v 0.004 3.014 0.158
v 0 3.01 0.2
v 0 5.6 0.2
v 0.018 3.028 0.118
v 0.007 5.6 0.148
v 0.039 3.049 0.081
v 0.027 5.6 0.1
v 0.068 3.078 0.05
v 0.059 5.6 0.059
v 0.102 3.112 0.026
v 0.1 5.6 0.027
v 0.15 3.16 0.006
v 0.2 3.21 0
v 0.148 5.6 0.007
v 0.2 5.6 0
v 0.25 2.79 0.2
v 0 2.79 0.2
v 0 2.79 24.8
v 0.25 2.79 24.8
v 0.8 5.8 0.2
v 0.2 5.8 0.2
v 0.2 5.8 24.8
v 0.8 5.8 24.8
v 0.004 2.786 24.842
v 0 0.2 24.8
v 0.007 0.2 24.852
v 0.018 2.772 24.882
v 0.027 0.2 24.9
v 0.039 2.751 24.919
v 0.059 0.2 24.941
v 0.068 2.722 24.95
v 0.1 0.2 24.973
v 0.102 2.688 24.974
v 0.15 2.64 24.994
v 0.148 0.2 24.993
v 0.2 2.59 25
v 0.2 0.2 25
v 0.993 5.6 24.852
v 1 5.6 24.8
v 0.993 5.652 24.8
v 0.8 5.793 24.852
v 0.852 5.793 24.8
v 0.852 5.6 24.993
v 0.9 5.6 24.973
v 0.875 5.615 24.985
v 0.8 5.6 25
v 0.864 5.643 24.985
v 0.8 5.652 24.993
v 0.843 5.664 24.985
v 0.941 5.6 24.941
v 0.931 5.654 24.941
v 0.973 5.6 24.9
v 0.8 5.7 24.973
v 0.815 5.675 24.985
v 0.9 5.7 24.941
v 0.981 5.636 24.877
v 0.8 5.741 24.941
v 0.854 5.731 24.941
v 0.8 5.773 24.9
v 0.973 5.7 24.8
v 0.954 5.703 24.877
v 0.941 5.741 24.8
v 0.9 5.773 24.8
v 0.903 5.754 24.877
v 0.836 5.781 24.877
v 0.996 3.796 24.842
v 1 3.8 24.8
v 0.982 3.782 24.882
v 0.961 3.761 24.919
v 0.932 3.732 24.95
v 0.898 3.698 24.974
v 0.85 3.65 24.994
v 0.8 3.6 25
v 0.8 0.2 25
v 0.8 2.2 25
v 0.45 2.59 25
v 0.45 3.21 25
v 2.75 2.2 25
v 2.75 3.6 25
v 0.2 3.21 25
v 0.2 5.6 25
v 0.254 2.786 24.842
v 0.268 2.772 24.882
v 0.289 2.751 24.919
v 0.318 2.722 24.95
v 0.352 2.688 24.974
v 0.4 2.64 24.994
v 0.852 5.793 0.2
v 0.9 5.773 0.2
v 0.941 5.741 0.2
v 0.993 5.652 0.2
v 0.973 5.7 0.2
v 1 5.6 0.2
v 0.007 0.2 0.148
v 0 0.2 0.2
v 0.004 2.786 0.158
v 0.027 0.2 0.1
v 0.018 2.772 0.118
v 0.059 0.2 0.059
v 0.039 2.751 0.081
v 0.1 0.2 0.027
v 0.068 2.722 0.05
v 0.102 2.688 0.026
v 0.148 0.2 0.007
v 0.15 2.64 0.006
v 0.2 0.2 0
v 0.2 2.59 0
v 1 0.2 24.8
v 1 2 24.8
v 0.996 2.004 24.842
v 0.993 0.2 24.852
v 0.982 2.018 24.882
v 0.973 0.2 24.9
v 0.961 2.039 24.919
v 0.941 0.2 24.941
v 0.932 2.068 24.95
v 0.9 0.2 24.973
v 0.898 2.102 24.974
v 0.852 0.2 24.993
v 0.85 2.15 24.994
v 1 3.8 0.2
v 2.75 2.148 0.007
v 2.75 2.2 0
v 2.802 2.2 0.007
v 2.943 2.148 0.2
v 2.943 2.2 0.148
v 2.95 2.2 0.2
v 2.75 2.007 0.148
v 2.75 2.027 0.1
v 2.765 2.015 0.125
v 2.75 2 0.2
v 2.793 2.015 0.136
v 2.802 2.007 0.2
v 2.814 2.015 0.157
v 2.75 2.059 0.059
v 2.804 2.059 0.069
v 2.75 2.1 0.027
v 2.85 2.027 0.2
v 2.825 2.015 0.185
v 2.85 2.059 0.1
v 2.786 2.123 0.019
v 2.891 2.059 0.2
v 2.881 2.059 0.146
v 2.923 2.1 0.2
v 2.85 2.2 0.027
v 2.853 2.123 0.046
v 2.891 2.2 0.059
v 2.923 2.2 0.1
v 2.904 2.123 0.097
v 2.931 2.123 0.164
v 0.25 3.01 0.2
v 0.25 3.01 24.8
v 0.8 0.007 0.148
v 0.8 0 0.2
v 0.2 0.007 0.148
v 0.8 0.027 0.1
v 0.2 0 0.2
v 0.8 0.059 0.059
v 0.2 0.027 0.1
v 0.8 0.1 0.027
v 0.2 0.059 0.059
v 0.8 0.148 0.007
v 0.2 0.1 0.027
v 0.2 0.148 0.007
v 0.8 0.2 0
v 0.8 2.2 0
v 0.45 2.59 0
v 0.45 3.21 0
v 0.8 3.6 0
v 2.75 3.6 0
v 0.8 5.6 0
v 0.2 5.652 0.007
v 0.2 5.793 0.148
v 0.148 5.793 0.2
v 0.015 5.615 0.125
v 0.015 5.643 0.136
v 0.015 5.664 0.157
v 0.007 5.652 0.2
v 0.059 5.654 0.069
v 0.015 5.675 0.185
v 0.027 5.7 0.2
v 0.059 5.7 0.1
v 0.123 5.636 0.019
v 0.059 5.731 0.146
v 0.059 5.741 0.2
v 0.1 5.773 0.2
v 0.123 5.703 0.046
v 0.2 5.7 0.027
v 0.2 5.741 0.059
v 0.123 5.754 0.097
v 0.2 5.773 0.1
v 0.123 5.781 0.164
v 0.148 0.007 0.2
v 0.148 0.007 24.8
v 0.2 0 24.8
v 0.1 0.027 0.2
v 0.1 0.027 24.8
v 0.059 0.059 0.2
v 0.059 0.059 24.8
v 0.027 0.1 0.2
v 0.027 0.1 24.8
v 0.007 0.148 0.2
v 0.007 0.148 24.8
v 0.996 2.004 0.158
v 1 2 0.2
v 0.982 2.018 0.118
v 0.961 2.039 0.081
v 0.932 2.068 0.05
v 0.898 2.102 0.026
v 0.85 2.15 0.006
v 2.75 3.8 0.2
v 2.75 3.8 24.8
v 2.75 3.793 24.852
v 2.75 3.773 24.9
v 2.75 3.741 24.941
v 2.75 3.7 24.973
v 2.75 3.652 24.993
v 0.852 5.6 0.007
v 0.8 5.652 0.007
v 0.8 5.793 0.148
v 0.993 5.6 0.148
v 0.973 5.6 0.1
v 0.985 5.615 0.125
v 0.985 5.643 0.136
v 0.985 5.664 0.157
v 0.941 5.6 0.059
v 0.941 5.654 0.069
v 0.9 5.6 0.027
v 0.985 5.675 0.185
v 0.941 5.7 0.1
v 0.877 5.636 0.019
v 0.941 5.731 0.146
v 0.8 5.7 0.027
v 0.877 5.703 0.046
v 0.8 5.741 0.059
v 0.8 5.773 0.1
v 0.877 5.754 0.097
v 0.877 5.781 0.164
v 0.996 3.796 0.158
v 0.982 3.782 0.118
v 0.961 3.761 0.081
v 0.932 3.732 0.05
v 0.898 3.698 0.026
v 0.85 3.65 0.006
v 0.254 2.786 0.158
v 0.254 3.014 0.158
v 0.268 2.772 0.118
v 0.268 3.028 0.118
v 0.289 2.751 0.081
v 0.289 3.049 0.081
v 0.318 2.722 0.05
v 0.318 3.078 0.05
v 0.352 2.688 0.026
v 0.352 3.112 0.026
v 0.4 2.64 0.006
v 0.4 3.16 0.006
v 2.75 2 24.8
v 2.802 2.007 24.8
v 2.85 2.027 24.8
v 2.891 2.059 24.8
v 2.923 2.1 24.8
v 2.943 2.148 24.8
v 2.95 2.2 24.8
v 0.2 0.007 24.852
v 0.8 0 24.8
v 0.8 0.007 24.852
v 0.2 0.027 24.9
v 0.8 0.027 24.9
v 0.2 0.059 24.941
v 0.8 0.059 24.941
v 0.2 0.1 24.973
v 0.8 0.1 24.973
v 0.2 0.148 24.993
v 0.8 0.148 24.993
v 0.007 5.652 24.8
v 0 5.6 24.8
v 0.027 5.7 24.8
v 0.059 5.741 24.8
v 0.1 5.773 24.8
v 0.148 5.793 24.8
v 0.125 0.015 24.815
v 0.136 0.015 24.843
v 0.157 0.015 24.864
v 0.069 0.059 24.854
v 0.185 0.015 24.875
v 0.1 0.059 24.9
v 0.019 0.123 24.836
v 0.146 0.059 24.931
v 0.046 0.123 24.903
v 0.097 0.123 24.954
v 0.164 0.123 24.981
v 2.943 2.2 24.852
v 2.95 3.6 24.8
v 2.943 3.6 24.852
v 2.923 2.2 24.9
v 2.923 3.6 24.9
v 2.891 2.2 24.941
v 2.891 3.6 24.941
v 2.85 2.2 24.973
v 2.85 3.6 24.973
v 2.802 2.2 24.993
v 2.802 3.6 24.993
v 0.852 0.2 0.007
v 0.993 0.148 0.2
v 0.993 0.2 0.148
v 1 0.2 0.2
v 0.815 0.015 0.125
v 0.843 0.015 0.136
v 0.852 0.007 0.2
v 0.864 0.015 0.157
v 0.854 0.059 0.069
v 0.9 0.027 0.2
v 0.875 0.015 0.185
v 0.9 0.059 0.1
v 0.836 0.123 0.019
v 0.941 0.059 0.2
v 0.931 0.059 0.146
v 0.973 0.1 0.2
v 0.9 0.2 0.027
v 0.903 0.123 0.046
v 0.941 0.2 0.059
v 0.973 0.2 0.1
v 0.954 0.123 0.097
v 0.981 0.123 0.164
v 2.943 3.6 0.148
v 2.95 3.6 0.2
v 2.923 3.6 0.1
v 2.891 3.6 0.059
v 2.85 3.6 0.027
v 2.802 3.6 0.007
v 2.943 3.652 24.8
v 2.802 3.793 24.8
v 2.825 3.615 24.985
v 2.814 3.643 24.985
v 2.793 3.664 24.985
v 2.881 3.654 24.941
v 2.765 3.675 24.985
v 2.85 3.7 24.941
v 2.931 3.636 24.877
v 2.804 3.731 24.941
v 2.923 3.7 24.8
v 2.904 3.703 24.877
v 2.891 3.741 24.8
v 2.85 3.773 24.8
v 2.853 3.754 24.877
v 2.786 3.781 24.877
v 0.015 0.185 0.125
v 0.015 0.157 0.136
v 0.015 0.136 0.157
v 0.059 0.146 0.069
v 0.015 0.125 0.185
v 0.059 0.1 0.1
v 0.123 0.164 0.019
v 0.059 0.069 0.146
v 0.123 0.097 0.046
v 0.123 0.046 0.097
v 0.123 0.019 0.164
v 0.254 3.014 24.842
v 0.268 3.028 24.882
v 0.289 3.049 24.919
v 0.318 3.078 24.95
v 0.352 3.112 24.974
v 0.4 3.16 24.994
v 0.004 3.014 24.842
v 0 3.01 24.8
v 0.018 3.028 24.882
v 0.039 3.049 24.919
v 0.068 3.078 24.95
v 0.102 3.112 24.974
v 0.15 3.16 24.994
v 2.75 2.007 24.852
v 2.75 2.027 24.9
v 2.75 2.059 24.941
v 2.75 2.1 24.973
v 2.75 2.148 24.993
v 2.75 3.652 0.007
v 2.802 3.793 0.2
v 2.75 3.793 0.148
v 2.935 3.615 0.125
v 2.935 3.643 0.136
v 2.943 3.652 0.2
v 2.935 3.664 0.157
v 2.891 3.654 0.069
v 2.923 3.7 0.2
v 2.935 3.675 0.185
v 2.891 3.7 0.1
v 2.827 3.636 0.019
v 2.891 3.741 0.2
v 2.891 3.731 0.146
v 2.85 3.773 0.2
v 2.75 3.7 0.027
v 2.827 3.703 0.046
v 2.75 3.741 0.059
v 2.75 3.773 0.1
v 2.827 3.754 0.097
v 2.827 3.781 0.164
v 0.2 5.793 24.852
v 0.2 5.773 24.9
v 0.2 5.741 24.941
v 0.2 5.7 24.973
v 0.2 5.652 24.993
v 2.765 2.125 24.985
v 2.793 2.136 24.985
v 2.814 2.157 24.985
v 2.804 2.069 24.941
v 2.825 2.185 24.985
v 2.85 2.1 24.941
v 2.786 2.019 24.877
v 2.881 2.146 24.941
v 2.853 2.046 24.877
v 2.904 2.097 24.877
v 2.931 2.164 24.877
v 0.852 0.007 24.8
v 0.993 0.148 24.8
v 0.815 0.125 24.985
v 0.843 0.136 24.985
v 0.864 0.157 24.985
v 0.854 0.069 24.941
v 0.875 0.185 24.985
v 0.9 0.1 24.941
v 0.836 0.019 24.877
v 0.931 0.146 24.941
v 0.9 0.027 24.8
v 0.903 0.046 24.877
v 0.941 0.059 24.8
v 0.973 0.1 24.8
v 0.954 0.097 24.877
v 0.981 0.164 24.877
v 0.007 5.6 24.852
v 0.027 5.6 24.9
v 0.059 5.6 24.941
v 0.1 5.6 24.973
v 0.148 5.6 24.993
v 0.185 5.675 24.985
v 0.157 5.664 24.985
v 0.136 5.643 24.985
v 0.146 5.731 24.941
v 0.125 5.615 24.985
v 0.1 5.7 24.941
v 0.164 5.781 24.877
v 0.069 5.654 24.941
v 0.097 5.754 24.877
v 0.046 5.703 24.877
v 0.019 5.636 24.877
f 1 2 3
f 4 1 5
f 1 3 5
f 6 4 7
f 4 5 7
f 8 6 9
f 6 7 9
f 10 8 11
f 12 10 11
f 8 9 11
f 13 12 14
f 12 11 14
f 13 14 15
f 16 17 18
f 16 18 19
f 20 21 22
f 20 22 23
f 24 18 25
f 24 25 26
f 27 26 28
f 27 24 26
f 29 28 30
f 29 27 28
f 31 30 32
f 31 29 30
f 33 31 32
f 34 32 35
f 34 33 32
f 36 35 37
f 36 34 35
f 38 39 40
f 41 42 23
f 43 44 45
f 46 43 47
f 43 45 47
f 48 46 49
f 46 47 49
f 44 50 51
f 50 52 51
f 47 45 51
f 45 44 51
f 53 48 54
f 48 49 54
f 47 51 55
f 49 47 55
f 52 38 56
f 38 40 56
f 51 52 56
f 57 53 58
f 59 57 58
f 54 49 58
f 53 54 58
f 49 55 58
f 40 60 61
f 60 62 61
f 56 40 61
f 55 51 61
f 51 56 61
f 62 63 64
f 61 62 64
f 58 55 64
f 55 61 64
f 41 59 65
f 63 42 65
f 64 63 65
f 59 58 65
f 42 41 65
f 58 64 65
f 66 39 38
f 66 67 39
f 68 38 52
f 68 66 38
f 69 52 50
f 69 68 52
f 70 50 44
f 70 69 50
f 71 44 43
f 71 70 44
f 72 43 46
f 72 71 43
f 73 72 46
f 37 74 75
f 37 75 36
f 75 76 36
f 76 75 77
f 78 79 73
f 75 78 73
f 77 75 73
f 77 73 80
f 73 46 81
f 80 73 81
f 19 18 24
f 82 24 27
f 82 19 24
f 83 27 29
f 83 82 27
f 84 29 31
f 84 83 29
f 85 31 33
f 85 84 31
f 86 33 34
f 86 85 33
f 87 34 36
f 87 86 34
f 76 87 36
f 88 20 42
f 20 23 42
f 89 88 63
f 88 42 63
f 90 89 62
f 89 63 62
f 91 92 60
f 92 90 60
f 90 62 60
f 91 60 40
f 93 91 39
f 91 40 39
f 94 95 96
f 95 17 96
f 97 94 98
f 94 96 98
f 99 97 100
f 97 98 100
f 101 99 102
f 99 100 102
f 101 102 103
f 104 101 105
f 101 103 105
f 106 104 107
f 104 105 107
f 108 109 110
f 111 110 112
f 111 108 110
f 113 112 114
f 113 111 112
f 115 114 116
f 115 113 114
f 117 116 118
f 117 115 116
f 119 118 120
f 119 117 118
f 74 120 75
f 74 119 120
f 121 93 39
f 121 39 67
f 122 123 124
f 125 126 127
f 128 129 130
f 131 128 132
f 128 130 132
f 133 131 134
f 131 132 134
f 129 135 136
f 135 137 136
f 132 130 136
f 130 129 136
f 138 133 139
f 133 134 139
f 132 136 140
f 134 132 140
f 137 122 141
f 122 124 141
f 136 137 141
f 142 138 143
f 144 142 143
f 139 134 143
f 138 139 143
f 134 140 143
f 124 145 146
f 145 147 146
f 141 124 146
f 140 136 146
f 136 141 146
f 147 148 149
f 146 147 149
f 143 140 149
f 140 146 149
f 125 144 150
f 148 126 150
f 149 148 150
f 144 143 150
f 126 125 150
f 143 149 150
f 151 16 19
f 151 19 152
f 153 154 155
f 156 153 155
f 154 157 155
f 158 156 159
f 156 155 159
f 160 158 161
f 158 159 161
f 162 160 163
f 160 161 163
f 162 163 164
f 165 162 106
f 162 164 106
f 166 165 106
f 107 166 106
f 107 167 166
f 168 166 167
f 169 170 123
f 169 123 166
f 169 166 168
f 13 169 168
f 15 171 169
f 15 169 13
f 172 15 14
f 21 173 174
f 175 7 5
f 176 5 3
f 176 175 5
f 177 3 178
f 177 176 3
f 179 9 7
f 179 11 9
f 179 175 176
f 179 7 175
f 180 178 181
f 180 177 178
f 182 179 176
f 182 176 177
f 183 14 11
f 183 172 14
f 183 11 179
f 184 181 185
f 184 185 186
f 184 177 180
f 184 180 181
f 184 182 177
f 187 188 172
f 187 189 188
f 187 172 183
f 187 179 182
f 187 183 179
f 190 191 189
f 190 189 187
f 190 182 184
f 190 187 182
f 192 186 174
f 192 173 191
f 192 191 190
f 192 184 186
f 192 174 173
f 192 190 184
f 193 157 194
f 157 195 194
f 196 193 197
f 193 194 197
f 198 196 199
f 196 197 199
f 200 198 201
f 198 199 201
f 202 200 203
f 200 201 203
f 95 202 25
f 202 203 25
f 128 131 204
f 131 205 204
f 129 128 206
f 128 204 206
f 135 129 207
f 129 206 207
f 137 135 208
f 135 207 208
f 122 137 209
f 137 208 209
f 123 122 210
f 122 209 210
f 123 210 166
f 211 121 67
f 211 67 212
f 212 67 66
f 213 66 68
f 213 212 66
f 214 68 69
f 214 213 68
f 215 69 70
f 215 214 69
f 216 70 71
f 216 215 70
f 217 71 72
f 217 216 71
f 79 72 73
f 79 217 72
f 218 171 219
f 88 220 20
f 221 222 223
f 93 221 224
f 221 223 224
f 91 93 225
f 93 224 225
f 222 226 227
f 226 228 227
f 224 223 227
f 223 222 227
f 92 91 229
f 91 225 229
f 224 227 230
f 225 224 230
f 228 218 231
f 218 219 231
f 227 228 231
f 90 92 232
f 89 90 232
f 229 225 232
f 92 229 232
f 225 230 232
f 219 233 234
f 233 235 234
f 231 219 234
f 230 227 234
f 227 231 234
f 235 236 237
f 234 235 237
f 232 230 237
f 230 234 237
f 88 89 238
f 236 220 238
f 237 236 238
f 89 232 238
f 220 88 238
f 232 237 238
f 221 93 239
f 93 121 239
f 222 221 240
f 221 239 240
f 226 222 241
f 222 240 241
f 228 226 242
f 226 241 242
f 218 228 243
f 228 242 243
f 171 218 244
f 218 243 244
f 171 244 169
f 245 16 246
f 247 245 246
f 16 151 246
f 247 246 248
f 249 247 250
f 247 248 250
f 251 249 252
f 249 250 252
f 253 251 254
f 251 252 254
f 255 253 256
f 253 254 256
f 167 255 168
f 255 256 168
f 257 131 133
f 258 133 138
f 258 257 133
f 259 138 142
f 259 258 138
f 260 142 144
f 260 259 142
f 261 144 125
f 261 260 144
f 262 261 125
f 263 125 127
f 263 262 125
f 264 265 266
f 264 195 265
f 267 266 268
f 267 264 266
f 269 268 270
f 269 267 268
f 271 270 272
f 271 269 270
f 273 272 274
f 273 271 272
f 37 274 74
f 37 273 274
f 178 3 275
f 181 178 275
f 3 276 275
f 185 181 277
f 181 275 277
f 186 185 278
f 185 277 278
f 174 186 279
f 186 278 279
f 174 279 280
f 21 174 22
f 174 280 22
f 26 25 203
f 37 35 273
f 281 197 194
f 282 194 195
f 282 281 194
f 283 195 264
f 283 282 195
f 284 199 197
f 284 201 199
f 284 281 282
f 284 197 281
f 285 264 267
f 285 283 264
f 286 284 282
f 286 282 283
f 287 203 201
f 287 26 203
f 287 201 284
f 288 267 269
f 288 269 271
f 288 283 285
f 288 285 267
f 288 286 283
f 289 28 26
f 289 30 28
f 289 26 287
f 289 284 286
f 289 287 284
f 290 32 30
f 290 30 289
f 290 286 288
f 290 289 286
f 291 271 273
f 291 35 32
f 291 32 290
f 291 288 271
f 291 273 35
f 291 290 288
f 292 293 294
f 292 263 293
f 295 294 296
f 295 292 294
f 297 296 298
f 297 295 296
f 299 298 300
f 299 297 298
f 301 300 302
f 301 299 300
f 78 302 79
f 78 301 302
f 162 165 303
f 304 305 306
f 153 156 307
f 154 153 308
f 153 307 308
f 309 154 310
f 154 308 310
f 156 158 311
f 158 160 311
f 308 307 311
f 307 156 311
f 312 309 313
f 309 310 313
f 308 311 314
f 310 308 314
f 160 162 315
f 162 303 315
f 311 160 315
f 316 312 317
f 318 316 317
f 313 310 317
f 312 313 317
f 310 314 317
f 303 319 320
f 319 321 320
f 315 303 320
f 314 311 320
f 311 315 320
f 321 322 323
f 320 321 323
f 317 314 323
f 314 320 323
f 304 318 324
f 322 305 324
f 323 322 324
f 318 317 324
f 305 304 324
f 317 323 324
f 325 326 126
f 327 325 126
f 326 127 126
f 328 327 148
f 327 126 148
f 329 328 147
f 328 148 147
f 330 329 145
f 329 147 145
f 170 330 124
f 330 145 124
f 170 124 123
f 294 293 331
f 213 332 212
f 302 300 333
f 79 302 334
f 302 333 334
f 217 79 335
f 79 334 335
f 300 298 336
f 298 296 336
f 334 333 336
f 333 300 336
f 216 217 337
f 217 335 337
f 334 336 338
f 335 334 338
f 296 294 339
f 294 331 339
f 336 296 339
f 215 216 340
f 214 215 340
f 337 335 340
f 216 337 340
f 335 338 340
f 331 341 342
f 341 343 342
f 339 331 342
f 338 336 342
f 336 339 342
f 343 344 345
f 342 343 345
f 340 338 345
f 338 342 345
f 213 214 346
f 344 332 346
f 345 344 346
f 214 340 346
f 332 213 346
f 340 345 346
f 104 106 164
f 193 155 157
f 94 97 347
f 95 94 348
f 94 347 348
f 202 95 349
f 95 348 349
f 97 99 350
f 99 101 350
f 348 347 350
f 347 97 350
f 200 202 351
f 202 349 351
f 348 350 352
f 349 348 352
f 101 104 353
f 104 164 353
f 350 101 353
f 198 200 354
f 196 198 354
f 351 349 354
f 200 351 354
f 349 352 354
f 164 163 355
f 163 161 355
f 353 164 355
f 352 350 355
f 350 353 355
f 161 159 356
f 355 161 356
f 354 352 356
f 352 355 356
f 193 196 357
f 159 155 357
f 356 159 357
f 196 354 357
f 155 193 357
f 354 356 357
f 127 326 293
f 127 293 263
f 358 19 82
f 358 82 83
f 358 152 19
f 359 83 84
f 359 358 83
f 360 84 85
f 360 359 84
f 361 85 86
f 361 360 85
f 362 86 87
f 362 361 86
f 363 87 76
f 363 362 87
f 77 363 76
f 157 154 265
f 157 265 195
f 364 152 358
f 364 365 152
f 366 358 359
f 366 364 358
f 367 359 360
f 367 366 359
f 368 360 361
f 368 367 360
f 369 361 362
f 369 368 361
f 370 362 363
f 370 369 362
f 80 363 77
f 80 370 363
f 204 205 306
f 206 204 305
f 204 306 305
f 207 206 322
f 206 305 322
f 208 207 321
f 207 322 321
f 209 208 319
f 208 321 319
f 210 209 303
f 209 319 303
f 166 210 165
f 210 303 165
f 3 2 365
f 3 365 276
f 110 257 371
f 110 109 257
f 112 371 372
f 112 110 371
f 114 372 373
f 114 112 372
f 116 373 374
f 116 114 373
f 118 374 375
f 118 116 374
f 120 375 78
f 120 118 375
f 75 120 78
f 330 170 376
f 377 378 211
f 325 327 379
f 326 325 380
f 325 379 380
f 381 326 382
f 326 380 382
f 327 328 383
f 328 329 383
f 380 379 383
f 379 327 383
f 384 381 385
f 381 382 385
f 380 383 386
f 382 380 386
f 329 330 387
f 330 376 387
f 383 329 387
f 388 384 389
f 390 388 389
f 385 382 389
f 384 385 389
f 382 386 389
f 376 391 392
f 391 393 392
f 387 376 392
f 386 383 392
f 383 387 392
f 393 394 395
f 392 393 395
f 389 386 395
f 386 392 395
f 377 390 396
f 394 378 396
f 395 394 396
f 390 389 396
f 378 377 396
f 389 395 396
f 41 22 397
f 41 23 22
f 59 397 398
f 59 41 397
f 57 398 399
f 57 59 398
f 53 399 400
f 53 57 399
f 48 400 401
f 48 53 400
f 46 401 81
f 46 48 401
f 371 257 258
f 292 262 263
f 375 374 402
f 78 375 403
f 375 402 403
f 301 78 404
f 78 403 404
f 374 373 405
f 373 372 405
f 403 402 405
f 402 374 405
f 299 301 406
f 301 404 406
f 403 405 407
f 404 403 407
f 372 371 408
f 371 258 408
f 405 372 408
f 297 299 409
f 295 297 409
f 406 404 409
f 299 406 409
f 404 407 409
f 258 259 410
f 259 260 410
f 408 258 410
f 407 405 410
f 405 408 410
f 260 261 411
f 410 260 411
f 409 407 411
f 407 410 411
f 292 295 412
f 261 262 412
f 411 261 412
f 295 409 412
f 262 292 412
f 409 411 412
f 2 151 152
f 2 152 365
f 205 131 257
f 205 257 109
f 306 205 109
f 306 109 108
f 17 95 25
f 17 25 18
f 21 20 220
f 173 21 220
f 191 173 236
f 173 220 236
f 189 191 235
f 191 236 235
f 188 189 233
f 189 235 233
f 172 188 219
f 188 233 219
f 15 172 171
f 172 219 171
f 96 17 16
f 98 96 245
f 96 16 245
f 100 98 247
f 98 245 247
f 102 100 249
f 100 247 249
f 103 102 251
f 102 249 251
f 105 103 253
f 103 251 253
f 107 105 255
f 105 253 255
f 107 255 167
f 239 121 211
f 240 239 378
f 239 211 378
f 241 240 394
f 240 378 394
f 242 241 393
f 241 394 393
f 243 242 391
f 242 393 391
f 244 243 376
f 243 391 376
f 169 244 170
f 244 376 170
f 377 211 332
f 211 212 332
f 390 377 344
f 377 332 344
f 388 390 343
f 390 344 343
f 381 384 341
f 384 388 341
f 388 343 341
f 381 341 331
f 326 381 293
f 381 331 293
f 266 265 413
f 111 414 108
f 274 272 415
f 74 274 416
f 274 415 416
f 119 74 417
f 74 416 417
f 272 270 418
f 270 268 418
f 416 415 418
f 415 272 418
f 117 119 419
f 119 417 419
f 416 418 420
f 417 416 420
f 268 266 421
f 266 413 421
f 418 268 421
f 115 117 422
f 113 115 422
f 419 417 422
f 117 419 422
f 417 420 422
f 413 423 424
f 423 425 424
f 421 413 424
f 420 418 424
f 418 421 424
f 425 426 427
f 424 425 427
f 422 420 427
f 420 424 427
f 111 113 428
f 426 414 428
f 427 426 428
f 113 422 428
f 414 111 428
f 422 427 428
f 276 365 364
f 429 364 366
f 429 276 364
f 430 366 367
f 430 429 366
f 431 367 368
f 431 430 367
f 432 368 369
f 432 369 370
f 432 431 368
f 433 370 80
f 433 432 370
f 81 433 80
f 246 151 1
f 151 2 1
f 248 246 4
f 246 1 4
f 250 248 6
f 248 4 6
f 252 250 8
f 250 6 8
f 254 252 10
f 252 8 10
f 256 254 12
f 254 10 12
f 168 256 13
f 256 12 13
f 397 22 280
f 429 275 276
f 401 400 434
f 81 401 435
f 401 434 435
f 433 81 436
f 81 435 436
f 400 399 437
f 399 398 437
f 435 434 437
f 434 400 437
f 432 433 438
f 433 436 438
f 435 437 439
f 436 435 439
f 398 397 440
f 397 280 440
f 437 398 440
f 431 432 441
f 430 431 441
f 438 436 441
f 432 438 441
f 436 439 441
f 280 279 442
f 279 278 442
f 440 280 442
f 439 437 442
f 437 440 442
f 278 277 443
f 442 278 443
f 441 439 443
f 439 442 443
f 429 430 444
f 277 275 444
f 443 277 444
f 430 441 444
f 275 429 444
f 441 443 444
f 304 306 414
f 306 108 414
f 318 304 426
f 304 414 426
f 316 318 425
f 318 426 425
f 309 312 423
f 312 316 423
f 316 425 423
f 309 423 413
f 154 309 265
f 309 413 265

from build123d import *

# Parameters (mm, degrees)
AUFSATZ_LINEAR_AUSTRAGEN1_DEPTH = 25
VERRUNDUNG1_R                   = 0.2


with BuildPart() as part:
    # Skizze1 → Aufsatz-Linear austragen1 (new body)
    with BuildSketch(Plane.XY):
        Polygon((2.95, 2), (1, 2), (1, 0), (0, 0), (0, 2.79), (0.25, 2.79), (0.25, 3.01), (0, 3.01), (0, 5.8), (1, 5.8), (1, 3.8), (2.95, 3.8), align=None)
    extrude(amount=AUFSATZ_LINEAR_AUSTRAGEN1_DEPTH)

    # Verrundung1
    verrundung1_edges = [part.edges().sort_by_distance(p)[0] for p in [
        (0.5, 5.8, 0),
        (1, 4.8, 0),
        (0.25, 2.9, 25),
        (1.975, 3.8, 0),
        (2.95, 2.9, 0),
        (1.975, 2, 0),
        (1, 1, 0),
        (0.5, 0, 0),
        (0, 1.395, 0),
        (0.125, 2.79, 0),
        (0.25, 2.9, 0),
        (0.125, 3.01, 0),
        (0, 4.405, 0),
        (0.125, 2.79, 25),
        (0, 5.8, 12.5),
        (1, 5.8, 12.5),
        (0, 1.395, 25),
        (2.95, 3.8, 12.5),
        (2.95, 2, 12.5),
        (1, 0, 12.5),
        (0, 0, 12.5),
        (0.5, 0, 25),
        (1, 1, 25),
        (1.975, 2, 25),
        (2.95, 2.9, 25),
        (1.975, 3.8, 25),
        (1, 4.8, 25),
        (0.5, 5.8, 25),
        (0, 4.405, 25),
        (0.125, 3.01, 25),
    ]]
    fillet(verrundung1_edges, radius=VERRUNDUNG1_R)


solid = part.part
